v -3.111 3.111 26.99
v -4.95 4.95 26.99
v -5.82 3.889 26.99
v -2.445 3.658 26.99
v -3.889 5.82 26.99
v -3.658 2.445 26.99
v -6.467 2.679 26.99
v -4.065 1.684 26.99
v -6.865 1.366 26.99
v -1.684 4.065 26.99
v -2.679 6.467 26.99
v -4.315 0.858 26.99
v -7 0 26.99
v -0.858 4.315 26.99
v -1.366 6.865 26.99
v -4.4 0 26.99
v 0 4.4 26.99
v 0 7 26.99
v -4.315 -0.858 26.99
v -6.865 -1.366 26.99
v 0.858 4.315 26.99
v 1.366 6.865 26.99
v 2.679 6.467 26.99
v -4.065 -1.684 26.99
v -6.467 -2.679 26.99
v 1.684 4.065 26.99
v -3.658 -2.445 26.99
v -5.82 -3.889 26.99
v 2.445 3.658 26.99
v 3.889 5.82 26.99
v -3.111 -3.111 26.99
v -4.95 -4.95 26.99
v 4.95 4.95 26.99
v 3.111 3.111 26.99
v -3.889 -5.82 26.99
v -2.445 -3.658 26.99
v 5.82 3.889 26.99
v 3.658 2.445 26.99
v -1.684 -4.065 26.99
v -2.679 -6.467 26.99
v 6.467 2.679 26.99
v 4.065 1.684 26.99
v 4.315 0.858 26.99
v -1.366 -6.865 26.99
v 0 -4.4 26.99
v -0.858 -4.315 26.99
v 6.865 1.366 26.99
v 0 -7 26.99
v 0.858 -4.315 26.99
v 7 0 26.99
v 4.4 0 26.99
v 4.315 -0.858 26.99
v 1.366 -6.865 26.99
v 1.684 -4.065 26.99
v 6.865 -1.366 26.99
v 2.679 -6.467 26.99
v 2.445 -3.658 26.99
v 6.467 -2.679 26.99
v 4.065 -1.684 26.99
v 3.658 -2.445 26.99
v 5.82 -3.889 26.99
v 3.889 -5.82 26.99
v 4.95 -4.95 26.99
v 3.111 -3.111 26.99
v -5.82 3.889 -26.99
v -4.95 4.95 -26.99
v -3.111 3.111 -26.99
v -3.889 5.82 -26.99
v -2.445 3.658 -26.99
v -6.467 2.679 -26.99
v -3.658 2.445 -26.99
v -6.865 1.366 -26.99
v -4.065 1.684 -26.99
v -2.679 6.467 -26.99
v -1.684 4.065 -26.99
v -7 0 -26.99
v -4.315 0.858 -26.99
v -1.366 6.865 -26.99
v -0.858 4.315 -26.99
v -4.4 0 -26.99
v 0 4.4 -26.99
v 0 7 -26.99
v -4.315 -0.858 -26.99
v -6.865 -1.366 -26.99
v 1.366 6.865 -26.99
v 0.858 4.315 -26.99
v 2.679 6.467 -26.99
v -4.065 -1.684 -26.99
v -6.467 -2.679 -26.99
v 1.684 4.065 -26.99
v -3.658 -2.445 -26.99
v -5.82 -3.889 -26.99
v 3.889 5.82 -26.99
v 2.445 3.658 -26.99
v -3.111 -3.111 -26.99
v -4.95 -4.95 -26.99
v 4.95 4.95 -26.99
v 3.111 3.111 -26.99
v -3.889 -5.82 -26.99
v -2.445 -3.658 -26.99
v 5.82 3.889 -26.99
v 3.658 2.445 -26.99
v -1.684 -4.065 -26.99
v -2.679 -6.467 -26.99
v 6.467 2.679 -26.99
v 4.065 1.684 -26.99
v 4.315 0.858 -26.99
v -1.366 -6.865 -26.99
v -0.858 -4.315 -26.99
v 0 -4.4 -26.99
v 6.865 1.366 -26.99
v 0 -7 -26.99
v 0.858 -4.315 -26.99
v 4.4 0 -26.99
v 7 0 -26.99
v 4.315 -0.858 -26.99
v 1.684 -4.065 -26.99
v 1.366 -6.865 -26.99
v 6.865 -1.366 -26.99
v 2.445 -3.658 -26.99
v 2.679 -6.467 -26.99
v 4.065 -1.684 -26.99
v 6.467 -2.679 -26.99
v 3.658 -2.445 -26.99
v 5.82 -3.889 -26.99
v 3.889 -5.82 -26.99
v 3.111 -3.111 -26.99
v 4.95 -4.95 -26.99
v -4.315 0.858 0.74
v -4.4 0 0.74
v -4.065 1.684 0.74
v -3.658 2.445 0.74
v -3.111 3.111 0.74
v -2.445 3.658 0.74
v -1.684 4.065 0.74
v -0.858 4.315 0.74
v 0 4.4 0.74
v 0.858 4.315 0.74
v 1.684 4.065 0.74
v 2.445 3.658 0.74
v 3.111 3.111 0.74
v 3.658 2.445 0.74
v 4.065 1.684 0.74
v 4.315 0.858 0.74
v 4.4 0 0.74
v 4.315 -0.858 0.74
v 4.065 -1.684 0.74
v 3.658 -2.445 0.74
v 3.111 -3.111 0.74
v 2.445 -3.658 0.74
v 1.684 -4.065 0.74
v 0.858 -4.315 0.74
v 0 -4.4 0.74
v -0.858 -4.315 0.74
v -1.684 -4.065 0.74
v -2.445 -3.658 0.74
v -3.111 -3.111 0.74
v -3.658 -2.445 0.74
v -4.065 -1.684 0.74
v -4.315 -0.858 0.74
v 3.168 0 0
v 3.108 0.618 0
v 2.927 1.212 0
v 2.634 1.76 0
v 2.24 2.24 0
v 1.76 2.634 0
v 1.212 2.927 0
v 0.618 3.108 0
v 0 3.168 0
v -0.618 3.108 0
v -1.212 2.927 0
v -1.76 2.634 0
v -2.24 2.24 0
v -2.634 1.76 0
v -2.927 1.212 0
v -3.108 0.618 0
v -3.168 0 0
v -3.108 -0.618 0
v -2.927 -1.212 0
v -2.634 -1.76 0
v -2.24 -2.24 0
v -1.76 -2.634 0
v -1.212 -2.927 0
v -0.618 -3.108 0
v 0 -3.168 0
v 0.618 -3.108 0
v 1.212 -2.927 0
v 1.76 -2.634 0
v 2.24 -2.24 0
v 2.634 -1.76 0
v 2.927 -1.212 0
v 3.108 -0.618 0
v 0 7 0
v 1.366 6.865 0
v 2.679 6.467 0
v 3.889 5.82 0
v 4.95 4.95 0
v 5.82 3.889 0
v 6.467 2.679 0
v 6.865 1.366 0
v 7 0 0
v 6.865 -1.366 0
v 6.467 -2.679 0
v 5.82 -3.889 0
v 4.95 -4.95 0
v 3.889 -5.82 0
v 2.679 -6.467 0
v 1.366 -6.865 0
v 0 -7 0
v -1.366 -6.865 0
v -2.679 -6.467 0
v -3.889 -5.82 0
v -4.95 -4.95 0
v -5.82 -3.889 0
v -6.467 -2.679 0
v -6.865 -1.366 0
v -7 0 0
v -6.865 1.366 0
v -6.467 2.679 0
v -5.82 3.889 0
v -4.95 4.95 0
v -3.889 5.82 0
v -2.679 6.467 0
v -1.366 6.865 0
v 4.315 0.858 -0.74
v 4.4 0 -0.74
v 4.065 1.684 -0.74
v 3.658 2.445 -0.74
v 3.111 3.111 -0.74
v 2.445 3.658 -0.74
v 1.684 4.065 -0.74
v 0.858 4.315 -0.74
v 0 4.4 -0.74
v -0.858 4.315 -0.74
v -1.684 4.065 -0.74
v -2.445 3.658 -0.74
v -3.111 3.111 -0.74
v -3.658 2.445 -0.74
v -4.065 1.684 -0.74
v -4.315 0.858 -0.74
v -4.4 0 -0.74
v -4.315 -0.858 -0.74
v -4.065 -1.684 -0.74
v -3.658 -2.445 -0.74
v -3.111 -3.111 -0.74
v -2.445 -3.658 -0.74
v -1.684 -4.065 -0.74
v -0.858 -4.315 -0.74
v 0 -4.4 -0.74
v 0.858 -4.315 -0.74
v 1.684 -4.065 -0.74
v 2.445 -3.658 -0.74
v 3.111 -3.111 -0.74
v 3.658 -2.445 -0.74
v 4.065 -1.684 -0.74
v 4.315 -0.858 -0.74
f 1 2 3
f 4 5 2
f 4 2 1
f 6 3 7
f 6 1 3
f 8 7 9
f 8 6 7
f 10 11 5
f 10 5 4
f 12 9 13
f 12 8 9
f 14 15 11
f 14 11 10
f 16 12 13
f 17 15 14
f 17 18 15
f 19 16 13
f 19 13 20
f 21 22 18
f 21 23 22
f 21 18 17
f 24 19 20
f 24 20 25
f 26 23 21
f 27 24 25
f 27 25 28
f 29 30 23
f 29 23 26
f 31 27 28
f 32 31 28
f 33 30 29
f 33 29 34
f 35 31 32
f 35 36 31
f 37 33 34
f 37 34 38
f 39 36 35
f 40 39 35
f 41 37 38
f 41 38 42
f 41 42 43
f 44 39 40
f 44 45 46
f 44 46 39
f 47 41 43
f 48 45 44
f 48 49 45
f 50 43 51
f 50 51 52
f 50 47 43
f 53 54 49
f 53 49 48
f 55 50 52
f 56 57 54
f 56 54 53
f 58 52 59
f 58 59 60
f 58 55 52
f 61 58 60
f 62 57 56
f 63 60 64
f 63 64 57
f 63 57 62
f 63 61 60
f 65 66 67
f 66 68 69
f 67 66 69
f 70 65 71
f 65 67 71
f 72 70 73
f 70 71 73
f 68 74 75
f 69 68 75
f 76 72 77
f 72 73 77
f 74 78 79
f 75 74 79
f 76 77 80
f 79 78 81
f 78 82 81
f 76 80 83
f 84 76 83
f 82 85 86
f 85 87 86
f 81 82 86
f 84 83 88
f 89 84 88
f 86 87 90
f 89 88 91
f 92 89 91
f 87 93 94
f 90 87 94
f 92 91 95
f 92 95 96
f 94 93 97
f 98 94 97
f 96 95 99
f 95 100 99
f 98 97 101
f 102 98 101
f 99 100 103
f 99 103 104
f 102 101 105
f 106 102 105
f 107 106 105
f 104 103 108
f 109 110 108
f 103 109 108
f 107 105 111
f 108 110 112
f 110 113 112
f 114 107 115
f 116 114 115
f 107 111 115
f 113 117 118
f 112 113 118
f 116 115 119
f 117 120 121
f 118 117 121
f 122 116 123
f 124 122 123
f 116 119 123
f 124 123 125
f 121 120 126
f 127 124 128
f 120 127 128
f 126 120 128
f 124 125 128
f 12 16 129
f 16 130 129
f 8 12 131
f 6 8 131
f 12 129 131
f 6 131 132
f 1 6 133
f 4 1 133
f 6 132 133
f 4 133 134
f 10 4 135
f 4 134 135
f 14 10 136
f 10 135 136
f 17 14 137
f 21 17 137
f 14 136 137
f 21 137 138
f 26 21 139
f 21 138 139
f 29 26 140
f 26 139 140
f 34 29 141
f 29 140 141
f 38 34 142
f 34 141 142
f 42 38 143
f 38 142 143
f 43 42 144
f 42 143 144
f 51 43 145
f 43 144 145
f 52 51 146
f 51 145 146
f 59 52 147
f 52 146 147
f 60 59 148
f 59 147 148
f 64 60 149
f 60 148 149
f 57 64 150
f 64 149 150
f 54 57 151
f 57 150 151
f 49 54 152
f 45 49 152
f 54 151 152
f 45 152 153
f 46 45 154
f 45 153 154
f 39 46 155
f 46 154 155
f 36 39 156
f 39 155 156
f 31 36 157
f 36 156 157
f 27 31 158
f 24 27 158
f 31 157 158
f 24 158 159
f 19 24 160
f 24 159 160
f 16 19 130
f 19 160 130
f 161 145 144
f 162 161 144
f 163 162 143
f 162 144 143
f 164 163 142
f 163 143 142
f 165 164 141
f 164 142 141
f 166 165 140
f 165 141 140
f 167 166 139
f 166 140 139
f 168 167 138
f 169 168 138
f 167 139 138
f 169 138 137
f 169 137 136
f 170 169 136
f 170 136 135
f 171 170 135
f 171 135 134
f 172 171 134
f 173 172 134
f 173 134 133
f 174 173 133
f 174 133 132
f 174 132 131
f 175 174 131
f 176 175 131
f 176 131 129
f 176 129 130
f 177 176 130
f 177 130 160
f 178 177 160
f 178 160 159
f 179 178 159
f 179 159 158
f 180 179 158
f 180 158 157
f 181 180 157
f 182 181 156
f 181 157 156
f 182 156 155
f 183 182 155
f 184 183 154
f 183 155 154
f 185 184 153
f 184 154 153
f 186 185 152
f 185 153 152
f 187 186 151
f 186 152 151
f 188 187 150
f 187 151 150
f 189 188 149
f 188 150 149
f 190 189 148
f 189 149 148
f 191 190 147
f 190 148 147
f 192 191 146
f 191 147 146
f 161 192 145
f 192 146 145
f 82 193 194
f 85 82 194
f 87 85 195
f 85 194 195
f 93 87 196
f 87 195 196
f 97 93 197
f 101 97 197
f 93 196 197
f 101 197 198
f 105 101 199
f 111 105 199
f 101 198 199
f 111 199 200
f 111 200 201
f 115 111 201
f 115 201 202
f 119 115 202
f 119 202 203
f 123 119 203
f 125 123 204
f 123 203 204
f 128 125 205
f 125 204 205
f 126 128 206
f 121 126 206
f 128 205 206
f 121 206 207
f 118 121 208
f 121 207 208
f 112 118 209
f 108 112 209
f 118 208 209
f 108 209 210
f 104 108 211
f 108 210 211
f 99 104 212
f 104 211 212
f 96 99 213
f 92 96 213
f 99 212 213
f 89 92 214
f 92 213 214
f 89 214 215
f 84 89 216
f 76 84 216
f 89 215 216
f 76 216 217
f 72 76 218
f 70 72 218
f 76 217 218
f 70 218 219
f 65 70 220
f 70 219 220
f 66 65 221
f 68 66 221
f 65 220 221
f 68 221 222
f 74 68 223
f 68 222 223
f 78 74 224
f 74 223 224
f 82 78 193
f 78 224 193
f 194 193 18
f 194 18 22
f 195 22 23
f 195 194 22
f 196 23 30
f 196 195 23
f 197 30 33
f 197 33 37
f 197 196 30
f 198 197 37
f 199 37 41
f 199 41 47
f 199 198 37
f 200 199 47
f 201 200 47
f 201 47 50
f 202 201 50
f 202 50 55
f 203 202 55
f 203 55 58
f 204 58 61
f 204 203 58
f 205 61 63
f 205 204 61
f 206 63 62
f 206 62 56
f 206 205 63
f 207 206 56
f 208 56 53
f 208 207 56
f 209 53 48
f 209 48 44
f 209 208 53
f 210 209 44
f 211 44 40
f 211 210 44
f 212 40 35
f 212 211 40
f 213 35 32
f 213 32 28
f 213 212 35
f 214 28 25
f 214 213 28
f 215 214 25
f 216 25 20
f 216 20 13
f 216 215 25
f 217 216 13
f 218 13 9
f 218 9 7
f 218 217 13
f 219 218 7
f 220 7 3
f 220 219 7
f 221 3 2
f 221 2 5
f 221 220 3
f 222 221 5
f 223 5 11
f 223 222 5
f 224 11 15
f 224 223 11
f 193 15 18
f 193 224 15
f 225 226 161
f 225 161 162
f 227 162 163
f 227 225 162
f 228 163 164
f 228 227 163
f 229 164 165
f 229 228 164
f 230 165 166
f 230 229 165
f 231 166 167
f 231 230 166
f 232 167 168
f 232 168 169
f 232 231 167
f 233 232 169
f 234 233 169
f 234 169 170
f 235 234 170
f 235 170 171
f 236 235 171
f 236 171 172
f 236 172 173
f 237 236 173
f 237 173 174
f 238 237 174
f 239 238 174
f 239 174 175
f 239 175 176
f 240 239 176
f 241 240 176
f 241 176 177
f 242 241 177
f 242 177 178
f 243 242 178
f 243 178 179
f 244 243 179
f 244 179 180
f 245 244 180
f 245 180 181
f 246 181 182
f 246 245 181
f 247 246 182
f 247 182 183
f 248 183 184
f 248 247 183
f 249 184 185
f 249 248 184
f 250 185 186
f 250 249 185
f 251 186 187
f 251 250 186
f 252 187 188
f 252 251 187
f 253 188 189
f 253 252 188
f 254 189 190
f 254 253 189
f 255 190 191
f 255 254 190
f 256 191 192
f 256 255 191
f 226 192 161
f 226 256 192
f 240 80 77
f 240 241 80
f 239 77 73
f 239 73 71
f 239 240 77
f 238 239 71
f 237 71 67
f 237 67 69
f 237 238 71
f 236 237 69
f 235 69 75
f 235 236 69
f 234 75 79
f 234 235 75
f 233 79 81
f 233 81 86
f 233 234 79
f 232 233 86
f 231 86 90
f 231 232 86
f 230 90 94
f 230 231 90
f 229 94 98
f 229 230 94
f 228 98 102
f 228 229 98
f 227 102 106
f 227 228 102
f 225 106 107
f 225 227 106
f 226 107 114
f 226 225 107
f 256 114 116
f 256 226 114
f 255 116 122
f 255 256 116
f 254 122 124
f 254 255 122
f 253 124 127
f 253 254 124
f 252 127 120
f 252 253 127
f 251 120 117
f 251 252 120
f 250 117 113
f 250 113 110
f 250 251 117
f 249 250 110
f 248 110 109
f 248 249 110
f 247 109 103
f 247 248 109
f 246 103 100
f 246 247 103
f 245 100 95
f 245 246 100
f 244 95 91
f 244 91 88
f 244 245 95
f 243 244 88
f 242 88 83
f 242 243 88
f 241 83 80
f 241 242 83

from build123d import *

# Parameters (mm, degrees)
SKETCH_1_W      = 26.990014613
SKETCH_1_H      = 7
M10X1_251_D     = 8.8
M10X1_251_DEPTH = 26.25
M10X1_251_TIP   = 2.643786724


with BuildPart() as part:
    # Эскиз1 → Повернуть1 (revolve)
    with BuildSketch(Plane(origin=(0, 0, 0), x_dir=(0, 0, -1), z_dir=(1, 0, 0))):
        with Locations((-13.495007307, 3.5)):
            Rectangle(SKETCH_1_W, SKETCH_1_H)
    revolve(axis=Axis((0, 0, 1000), (0, 0, -1)))

    # Отверстие обработанное метчиком M10x1.251
    with Locations(Plane.XY.offset(26.990014613)):
        with Locations((0, 0)):
            Hole(M10X1_251_D / 2, depth=M10X1_251_DEPTH)
            with Locations((0, 0, -(M10X1_251_DEPTH + M10X1_251_TIP / 2))):  # 118° drill point
                Cone(0, M10X1_251_D / 2, M10X1_251_TIP, mode=Mode.SUBTRACT)

    # Зеркальное отражение1: part across plane


with BuildPart() as part_1:
    add(part.part)
    add(part.part.mirror(Plane.XY))


solid = part_1.part
